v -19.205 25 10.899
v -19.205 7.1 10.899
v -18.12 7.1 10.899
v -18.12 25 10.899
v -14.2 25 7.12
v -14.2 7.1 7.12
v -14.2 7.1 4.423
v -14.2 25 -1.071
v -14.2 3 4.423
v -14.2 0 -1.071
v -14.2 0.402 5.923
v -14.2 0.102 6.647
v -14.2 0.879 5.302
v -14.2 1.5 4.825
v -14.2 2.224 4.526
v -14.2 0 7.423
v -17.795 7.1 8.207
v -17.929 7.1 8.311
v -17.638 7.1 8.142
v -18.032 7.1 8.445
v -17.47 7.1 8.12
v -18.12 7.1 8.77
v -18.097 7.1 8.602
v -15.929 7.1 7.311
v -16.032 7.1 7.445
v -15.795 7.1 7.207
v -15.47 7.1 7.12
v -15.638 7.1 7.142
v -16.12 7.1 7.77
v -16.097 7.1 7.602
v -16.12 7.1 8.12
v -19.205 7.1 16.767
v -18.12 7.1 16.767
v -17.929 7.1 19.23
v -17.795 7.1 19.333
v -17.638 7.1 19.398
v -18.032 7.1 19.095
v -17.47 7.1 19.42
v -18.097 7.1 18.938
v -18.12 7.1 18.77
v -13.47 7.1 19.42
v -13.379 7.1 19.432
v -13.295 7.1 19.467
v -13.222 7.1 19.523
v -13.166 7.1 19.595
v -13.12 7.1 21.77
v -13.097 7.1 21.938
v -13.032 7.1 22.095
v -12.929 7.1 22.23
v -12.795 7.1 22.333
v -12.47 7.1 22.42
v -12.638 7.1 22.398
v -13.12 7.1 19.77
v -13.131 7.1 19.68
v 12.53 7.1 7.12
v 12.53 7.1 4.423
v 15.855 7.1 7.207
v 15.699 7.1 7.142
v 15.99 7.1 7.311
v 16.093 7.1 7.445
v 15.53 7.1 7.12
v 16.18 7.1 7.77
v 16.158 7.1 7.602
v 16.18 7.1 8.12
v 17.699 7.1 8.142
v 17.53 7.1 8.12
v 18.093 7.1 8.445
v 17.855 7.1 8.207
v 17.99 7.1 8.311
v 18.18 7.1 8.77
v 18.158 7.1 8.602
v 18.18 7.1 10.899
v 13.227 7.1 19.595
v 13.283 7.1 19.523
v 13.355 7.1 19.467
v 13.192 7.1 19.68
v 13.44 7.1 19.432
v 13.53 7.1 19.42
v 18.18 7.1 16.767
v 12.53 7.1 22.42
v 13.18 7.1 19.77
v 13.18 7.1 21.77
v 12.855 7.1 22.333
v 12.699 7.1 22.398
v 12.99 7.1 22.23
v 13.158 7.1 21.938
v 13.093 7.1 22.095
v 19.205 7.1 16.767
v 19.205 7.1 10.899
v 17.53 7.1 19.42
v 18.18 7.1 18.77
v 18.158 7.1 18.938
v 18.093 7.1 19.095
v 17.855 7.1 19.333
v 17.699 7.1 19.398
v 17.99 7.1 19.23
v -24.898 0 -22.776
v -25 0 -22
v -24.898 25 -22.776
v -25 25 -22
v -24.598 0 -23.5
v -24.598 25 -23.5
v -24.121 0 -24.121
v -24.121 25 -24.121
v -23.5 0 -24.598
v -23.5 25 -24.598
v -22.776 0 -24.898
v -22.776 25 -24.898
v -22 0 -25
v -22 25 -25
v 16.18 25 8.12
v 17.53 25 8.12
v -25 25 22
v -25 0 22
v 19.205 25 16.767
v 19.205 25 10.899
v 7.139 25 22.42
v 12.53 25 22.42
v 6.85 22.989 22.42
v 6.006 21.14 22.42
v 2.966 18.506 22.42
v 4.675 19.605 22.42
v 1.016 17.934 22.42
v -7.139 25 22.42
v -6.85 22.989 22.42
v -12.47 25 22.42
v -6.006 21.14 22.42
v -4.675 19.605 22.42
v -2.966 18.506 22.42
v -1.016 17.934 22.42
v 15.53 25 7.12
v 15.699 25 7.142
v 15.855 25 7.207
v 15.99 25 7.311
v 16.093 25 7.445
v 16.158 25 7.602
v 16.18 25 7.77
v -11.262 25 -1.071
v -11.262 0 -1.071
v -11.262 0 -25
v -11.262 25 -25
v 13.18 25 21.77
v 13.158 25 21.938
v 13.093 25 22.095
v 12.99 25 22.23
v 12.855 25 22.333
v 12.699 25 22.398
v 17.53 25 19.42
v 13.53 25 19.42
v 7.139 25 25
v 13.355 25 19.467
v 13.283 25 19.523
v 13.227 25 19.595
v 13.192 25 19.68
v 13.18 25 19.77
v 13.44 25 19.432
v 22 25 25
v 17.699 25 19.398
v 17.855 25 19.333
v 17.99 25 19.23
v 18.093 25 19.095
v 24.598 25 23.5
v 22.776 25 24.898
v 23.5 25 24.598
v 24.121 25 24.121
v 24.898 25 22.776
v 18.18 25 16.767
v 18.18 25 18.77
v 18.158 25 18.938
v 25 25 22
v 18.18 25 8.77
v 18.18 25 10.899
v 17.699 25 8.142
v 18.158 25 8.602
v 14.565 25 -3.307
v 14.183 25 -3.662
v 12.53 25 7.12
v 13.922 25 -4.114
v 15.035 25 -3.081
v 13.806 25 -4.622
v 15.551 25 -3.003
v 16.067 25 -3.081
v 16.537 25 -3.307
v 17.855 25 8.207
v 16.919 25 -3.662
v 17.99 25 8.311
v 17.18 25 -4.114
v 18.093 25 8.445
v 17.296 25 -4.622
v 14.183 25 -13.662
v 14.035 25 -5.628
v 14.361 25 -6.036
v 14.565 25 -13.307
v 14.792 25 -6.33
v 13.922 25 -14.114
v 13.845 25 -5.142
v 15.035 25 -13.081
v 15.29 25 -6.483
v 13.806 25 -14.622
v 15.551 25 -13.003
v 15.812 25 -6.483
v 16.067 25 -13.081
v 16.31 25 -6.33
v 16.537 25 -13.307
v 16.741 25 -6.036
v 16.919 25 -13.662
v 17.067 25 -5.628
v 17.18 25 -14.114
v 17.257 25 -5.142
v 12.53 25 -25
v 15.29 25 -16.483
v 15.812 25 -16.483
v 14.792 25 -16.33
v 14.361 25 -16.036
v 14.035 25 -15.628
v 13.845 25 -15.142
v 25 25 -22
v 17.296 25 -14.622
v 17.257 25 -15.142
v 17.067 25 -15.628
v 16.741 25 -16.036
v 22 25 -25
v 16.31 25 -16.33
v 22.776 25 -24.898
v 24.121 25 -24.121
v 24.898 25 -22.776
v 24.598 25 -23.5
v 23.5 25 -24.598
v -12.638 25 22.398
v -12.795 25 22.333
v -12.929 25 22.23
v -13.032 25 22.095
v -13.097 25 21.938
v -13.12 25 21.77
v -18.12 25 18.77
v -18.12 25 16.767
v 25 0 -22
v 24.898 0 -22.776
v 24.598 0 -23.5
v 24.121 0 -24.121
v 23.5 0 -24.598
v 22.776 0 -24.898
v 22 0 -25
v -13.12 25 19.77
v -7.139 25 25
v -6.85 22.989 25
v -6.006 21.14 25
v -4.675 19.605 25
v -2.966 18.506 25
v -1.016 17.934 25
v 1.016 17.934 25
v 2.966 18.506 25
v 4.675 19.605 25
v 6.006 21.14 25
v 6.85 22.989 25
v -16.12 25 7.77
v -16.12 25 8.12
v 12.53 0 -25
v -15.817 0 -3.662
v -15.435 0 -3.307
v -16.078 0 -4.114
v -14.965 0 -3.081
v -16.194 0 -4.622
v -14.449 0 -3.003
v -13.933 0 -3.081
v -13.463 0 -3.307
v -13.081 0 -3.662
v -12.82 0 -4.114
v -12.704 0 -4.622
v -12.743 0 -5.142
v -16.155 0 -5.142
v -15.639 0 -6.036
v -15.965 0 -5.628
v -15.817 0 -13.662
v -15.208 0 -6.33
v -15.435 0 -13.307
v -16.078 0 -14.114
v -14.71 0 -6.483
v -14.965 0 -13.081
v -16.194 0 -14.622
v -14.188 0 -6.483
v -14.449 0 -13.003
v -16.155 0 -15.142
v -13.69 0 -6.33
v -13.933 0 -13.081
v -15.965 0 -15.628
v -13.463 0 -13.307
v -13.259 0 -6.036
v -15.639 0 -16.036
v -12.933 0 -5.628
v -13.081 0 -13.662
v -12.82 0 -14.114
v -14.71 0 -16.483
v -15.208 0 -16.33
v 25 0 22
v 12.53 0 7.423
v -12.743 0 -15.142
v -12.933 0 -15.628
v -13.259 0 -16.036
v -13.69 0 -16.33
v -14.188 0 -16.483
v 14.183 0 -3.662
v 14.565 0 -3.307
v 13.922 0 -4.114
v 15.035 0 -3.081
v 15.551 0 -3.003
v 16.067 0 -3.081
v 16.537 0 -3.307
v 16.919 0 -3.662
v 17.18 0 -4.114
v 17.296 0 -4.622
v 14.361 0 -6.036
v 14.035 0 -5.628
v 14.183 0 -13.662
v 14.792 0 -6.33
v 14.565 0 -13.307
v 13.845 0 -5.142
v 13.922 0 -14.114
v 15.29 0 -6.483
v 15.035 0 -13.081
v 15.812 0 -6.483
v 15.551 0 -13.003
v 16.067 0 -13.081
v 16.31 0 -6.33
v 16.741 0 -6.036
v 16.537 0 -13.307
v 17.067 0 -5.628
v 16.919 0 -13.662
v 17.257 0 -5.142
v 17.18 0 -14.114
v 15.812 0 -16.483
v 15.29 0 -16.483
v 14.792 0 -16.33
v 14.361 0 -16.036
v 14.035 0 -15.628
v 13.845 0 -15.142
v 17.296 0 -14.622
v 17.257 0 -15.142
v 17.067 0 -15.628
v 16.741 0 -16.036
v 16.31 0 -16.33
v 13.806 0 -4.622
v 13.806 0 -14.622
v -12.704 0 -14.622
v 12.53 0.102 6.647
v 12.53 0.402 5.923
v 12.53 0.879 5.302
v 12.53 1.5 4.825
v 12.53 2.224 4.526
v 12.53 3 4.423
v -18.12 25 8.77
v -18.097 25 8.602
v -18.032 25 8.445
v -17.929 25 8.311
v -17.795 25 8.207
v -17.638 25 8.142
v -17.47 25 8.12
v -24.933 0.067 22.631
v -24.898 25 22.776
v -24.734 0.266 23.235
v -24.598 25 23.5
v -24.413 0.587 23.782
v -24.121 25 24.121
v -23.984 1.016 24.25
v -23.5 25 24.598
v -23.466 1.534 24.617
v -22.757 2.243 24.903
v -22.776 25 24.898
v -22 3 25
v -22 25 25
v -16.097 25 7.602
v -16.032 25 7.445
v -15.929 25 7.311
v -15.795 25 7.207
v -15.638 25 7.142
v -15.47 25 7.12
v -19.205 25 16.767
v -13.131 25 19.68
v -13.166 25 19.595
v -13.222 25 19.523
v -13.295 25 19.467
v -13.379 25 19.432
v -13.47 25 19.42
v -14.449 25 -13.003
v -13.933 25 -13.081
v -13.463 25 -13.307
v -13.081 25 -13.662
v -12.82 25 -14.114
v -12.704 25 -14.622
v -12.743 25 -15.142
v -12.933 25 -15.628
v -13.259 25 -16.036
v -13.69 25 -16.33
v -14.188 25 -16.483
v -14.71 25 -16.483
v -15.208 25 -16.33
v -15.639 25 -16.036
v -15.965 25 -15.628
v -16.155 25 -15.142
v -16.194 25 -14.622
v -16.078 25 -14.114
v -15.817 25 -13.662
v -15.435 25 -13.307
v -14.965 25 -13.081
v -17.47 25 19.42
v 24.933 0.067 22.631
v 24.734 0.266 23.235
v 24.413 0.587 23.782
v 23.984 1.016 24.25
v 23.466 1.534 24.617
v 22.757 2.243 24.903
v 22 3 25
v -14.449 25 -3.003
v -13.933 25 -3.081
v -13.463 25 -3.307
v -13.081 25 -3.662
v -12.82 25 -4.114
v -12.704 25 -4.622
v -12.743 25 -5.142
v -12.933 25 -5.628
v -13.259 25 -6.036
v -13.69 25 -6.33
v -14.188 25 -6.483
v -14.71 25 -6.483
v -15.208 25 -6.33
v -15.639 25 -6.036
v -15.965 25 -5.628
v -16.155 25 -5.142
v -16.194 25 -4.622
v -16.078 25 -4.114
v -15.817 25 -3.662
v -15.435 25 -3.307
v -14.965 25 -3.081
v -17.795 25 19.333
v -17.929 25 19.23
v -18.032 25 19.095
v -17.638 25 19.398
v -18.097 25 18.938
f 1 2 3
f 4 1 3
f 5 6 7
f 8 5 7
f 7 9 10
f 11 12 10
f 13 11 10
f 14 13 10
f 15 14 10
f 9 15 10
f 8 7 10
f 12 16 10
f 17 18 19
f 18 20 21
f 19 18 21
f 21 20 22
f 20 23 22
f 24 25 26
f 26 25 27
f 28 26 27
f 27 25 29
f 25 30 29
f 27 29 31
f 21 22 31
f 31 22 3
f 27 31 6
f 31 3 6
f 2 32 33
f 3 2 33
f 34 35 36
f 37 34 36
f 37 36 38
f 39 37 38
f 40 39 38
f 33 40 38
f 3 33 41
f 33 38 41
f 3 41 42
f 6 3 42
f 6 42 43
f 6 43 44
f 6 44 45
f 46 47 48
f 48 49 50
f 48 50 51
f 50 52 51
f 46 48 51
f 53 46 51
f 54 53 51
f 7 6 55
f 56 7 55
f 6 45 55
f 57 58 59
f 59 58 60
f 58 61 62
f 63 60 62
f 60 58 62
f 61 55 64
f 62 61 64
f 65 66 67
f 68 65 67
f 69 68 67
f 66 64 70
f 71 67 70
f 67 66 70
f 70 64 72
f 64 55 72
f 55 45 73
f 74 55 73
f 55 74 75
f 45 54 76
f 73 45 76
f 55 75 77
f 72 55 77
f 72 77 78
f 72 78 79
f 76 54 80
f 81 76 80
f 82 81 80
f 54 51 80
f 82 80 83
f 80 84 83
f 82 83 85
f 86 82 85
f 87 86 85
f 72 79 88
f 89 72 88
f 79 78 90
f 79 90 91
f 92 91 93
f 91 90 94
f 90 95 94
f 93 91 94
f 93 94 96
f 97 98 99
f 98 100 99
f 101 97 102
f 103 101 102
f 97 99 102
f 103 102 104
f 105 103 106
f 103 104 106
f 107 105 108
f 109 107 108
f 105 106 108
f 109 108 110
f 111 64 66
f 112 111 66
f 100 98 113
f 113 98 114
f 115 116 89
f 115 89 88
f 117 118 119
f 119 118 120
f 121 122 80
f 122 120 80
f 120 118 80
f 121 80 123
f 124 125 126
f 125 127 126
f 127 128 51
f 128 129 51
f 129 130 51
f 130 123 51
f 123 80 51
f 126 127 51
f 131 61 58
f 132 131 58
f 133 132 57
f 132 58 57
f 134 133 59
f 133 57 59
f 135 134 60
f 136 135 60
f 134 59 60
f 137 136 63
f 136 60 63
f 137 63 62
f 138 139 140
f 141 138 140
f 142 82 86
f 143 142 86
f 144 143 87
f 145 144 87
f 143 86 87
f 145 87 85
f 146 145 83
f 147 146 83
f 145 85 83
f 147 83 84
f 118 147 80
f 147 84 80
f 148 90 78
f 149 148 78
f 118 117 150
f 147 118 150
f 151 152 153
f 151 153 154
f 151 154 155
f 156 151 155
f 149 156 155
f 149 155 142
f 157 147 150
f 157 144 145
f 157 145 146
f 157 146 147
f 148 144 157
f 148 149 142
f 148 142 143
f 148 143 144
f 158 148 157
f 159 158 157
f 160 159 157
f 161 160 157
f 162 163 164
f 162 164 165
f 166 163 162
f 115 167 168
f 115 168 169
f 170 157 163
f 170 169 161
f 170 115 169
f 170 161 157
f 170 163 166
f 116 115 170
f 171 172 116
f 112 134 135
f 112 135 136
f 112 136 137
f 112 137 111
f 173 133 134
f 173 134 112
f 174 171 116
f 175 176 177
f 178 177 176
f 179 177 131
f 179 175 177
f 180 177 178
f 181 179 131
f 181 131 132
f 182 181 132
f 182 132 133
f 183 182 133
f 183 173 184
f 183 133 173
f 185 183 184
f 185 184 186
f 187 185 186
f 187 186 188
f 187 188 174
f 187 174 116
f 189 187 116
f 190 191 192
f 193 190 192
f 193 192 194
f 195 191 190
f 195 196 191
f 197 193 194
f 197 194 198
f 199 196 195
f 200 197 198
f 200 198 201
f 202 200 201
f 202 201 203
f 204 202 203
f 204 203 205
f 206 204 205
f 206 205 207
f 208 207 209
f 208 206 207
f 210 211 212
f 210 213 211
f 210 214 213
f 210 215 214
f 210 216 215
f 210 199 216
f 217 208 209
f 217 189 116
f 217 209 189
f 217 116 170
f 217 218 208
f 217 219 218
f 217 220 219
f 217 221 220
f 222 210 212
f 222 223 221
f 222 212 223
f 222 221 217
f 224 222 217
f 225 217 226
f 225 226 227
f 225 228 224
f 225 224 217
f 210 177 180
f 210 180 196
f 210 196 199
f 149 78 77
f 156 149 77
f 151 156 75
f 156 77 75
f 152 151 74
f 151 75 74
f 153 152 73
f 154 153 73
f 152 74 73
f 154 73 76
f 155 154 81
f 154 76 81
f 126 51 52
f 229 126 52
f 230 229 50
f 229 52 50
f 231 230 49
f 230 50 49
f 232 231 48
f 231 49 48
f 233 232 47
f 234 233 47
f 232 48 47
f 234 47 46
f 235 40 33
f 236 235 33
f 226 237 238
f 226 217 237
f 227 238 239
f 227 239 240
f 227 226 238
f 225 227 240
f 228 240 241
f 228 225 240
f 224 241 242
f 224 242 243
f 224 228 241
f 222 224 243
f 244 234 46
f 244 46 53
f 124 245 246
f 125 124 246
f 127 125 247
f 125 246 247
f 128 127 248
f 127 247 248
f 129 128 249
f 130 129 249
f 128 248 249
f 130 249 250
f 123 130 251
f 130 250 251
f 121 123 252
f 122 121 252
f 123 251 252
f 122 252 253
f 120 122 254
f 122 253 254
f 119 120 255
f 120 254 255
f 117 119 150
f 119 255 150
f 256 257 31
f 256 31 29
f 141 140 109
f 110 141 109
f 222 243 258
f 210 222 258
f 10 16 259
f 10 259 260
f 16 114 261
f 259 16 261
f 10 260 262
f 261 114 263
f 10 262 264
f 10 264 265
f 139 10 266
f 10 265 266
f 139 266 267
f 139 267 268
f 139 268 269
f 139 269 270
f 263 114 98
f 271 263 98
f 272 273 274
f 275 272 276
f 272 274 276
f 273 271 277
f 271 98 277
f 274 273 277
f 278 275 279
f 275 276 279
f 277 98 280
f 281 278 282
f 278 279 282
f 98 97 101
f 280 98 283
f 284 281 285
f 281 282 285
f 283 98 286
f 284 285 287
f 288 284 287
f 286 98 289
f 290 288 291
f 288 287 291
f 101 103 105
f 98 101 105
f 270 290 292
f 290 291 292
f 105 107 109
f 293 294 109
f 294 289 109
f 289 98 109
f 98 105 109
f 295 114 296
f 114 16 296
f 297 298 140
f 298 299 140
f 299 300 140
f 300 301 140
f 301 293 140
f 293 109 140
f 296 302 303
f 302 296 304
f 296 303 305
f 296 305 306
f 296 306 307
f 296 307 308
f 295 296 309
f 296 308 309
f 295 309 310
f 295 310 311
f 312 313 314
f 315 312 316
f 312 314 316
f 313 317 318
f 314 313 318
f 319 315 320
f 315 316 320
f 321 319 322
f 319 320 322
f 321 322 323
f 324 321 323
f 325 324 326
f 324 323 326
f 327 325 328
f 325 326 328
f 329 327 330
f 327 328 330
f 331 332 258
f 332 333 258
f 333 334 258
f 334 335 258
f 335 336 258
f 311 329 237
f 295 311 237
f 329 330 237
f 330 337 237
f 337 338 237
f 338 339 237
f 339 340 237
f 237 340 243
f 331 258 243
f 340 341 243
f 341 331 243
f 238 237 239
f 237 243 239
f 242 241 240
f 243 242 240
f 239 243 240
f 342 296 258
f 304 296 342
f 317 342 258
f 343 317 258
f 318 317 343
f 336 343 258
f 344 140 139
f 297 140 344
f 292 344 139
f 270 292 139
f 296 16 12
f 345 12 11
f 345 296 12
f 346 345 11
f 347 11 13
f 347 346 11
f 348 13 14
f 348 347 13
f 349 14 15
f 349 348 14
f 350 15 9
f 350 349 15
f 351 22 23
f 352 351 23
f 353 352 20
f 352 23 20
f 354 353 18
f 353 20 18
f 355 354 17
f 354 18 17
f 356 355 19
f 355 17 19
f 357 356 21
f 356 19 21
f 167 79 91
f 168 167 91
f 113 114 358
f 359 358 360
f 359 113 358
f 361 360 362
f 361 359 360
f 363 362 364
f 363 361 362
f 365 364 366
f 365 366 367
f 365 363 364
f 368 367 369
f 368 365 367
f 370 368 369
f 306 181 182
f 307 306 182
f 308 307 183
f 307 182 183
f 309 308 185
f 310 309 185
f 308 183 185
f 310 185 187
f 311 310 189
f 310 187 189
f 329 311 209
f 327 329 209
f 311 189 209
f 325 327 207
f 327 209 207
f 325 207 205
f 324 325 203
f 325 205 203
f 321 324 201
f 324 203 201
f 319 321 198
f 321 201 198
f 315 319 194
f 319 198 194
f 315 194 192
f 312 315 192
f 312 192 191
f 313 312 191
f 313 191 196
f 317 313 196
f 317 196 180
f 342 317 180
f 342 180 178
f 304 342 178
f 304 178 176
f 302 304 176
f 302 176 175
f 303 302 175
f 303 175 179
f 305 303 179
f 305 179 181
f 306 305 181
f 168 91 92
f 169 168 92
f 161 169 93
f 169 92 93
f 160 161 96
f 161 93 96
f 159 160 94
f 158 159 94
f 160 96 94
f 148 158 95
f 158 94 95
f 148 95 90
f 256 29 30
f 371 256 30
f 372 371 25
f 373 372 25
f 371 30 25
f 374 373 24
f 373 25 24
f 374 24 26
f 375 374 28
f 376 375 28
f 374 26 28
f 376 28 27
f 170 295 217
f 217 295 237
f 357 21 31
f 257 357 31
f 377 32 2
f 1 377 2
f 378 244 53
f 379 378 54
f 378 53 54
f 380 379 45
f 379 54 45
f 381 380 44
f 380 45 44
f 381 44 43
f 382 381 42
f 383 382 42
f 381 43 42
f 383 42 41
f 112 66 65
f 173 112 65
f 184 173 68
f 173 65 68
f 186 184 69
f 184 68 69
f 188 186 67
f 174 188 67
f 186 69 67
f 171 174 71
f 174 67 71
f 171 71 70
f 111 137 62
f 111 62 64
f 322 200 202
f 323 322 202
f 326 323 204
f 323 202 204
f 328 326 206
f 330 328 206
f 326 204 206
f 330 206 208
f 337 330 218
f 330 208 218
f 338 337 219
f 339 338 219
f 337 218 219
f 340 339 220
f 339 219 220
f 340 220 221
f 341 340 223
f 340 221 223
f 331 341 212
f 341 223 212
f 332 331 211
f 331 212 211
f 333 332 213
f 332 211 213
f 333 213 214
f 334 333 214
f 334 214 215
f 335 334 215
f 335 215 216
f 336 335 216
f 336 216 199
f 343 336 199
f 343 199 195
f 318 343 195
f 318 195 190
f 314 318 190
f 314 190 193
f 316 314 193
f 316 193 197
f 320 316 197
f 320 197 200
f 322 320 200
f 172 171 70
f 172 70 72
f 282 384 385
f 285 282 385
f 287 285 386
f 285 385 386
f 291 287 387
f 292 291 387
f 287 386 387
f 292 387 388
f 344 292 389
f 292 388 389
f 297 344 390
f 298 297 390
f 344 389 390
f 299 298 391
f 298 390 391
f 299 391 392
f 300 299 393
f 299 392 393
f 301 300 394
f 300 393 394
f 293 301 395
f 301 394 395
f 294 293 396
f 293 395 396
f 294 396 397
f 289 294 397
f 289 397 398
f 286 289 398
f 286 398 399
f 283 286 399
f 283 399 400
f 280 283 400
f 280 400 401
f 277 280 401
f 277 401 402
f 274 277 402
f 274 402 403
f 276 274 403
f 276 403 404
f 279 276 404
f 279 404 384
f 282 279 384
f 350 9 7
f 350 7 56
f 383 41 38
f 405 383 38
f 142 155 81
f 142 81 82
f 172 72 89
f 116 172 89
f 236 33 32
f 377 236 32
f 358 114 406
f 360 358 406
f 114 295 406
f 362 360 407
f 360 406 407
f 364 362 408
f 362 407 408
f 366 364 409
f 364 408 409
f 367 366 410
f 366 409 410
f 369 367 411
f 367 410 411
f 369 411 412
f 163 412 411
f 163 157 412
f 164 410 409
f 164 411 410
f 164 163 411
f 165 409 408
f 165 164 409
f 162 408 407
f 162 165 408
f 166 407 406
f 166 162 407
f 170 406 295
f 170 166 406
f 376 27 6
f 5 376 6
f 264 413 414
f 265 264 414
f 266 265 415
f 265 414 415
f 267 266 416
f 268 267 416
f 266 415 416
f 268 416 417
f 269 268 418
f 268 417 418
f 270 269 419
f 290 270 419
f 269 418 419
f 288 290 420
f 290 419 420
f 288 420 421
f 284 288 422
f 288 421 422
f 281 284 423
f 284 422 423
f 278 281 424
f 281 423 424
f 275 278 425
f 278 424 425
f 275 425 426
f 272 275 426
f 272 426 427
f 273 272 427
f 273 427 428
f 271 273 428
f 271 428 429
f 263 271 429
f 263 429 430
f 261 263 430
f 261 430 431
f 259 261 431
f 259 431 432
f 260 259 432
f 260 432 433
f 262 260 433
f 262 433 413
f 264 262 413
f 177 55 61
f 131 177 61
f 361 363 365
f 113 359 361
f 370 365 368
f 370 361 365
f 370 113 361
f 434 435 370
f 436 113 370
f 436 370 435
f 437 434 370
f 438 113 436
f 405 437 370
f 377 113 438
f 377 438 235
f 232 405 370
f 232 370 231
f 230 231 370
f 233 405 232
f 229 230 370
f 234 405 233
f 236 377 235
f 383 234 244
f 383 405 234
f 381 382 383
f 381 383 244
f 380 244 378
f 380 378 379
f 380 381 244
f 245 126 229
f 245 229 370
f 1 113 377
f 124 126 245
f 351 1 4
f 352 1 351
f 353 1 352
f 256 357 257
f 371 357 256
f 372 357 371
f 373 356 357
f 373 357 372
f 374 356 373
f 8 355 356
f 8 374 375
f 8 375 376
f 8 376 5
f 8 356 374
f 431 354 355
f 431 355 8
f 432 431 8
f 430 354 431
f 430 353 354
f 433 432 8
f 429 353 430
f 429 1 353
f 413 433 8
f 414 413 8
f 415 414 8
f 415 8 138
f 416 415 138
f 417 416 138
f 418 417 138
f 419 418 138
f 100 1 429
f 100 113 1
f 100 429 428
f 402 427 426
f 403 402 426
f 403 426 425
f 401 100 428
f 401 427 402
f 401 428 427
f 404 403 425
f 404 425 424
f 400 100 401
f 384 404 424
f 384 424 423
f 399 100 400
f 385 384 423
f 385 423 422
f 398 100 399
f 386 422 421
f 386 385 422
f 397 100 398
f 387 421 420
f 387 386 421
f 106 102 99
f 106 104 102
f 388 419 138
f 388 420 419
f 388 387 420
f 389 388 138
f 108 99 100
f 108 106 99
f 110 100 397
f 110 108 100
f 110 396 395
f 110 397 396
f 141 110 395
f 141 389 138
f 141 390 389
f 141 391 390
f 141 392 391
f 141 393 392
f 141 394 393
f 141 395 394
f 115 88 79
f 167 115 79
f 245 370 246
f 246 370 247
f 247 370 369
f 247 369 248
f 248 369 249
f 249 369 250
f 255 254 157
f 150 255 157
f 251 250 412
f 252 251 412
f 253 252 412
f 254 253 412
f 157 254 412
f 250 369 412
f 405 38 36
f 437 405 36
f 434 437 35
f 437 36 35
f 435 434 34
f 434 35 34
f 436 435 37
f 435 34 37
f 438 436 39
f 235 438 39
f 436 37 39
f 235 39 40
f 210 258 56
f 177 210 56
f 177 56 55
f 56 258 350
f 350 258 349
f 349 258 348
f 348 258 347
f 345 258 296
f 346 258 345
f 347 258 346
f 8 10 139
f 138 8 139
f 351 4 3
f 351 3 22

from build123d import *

# Parameters (mm, degrees)
EXTRUDE_1_DEPTH     = 25
CUT_EXTRUDE_1_DEPTH = 10
SKETCH_5_W          = 41.777974616
SKETCH_5_H          = 18.894782553
EXTRUDE_4_DEPTH     = 7.1
SKETCH_7_R          = 1.75
CUT_EXTRUDE_2_DEPTH = 44.301270189
FILLET_1_R          = 3


with BuildPart() as part:
    # 草图1 → 凸台-拉伸1 (new body)
    with BuildSketch(Plane(origin=(0, 0, 0), x_dir=(1, 0, 0), z_dir=(0, 1, 0))):
        with BuildLine():
            Line((-25, -25), (25, -25))
            Line((25, -25), (25, 25))
            Line((25, 25), (12.530461135, 25))
            Line((12.530461135, 25), (12.530461135, -7.120248206))
            Line((12.530461135, -7.120248206), (15.530461135, -7.120248206))
            ThreePointArc((15.530461135, -7.120248206), (15.990080543, -7.310628798), (16.180461135, -7.770248206))
            Line((16.180461135, -7.770248206), (16.180461135, -8.120248206))
            Line((16.180461135, -8.120248206), (17.530461135, -8.120248206))
            ThreePointArc((17.530461135, -8.120248206), (17.990080543, -8.310628798), (18.180461135, -8.770248206))
            Line((18.180461135, -8.770248206), (18.180461135, -10.898803743))
            Line((18.180461135, -10.898803743), (19.204850948, -10.898803743))
            Line((19.204850948, -10.898803743), (19.204850948, -16.766546625))
            Line((19.204850948, -16.766546625), (18.180461135, -16.766546625))
            Line((18.180461135, -16.766546625), (18.180461135, -18.770248206))
            ThreePointArc((18.180461135, -18.770248206), (17.990080543, -19.229867614), (17.530461135, -19.420248206))
            Line((17.530461135, -19.420248206), (13.530461135, -19.420248206))
            ThreePointArc((13.530461135, -19.420248206), (13.282973762, -19.522760833), (13.180461135, -19.770248206))
            Line((13.180461135, -19.770248206), (13.180461135, -21.770248206))
            ThreePointArc((13.180461135, -21.770248206), (12.990080543, -22.229867614), (12.530461135, -22.420248206))
            Line((12.530461135, -22.420248206), (-12.469538865, -22.420248206))
            ThreePointArc((-12.469538865, -22.420248206), (-12.929158272, -22.229867614), (-13.119538865, -21.770248206))
            Line((-13.119538865, -21.770248206), (-13.119538865, -19.770248206))
            ThreePointArc((-13.119538865, -19.770248206), (-13.222051491, -19.522760833), (-13.469538865, -19.420248206))
            Line((-13.469538865, -19.420248206), (-17.469538865, -19.420248206))
            ThreePointArc((-17.469538865, -19.420248206), (-17.929158272, -19.229867614), (-18.119538865, -18.770248206))
            Line((-18.119538865, -18.770248206), (-18.119538865, -16.766546625))
            Line((-18.119538865, -16.766546625), (-18.180461135, -16.766546625))
            Line((-18.180461135, -16.766546625), (-19.204850948, -16.766546625))
            Line((-19.204850948, -16.766546625), (-19.204850948, -10.898803743))
            Line((-19.204850948, -10.898803743), (-18.180461135, -10.898803743))
            Line((-18.180461135, -10.898803743), (-18.119538865, -10.898803743))
            Line((-18.119538865, -10.898803743), (-18.119538865, -8.770248206))
            ThreePointArc((-18.119538865, -8.770248206), (-17.929158272, -8.310628798), (-17.469538865, -8.120248206))
            Line((-17.469538865, -8.120248206), (-16.119538865, -8.120248206))
            Line((-16.119538865, -8.120248206), (-16.119538865, -7.770248206))
            ThreePointArc((-16.119538865, -7.770248206), (-15.929158272, -7.310628798), (-15.469538865, -7.120248206))
            Line((-15.469538865, -7.120248206), (-14.200297417, -7.120248206))
            Line((-14.200297417, -7.120248206), (-14.200297417, 1.071122011))
            Line((-14.200297417, 1.071122011), (-11.261897063, 1.071122011))
            Line((-11.261897063, 1.071122011), (-11.261897063, 25))
            Line((-11.261897063, 25), (-25, 25))
            Line((-25, 25), (-25, -25))
        make_face()
    extrude(amount=EXTRUDE_1_DEPTH)

    # 草图2 → 切除-拉伸1 (cut)
    with BuildSketch(Plane.XY.offset(25)):
        with BuildLine():
            Line((7.139013901, 25), (-7.139013901, 25))
            ThreePointArc((-7.139013901, 25), (0, 17.860986099), (7.139013901, 25))
        make_face()
    extrude(amount=-CUT_EXTRUDE_1_DEPTH, mode=Mode.SUBTRACT)

    # 草图5 → 凸台-拉伸4 (add)
    with BuildSketch(Plane.XZ):
        with Locations((0, 13.870801672)):
            Rectangle(SKETCH_5_W, SKETCH_5_H)
    extrude(amount=-EXTRUDE_4_DEPTH)

    # 草图7 → 切除-拉伸2 (cut, through all)
    with BuildSketch(Plane(origin=(0, 25, 0), x_dir=(1, 0, 0), z_dir=(0, 1, 0))):
        with Locations(Location((15.550997874, 4.753034163, 0), (0, 0, 270))):
            Circle(SKETCH_7_R)
        with Locations(Location((15.550997874, 14.753034163, 0), (0, 0, 270))):
            Circle(SKETCH_7_R)
        with Locations(Location((-14.449002126, 4.753034163, 0), (0, 0, 270))):
            Circle(SKETCH_7_R)
        with Locations(Location((-14.449002126, 14.753034163, 0), (0, 0, 270))):
            Circle(SKETCH_7_R)
    extrude(amount=-CUT_EXTRUDE_2_DEPTH, mode=Mode.SUBTRACT)

    # 圆角1
    fillet_1_edges = [part.edges().sort_by_distance(p)[0] for p in [
        (-0.834918141, 0, 4.423410395),
        (0, 0, 25),
        (25, 12.5, -25),
        (25, 12.5, 25),
        (-25, 12.5, 25),
        (-25, 12.5, -25),
    ]]
    fillet(fillet_1_edges, radius=FILLET_1_R)


solid = part.part
